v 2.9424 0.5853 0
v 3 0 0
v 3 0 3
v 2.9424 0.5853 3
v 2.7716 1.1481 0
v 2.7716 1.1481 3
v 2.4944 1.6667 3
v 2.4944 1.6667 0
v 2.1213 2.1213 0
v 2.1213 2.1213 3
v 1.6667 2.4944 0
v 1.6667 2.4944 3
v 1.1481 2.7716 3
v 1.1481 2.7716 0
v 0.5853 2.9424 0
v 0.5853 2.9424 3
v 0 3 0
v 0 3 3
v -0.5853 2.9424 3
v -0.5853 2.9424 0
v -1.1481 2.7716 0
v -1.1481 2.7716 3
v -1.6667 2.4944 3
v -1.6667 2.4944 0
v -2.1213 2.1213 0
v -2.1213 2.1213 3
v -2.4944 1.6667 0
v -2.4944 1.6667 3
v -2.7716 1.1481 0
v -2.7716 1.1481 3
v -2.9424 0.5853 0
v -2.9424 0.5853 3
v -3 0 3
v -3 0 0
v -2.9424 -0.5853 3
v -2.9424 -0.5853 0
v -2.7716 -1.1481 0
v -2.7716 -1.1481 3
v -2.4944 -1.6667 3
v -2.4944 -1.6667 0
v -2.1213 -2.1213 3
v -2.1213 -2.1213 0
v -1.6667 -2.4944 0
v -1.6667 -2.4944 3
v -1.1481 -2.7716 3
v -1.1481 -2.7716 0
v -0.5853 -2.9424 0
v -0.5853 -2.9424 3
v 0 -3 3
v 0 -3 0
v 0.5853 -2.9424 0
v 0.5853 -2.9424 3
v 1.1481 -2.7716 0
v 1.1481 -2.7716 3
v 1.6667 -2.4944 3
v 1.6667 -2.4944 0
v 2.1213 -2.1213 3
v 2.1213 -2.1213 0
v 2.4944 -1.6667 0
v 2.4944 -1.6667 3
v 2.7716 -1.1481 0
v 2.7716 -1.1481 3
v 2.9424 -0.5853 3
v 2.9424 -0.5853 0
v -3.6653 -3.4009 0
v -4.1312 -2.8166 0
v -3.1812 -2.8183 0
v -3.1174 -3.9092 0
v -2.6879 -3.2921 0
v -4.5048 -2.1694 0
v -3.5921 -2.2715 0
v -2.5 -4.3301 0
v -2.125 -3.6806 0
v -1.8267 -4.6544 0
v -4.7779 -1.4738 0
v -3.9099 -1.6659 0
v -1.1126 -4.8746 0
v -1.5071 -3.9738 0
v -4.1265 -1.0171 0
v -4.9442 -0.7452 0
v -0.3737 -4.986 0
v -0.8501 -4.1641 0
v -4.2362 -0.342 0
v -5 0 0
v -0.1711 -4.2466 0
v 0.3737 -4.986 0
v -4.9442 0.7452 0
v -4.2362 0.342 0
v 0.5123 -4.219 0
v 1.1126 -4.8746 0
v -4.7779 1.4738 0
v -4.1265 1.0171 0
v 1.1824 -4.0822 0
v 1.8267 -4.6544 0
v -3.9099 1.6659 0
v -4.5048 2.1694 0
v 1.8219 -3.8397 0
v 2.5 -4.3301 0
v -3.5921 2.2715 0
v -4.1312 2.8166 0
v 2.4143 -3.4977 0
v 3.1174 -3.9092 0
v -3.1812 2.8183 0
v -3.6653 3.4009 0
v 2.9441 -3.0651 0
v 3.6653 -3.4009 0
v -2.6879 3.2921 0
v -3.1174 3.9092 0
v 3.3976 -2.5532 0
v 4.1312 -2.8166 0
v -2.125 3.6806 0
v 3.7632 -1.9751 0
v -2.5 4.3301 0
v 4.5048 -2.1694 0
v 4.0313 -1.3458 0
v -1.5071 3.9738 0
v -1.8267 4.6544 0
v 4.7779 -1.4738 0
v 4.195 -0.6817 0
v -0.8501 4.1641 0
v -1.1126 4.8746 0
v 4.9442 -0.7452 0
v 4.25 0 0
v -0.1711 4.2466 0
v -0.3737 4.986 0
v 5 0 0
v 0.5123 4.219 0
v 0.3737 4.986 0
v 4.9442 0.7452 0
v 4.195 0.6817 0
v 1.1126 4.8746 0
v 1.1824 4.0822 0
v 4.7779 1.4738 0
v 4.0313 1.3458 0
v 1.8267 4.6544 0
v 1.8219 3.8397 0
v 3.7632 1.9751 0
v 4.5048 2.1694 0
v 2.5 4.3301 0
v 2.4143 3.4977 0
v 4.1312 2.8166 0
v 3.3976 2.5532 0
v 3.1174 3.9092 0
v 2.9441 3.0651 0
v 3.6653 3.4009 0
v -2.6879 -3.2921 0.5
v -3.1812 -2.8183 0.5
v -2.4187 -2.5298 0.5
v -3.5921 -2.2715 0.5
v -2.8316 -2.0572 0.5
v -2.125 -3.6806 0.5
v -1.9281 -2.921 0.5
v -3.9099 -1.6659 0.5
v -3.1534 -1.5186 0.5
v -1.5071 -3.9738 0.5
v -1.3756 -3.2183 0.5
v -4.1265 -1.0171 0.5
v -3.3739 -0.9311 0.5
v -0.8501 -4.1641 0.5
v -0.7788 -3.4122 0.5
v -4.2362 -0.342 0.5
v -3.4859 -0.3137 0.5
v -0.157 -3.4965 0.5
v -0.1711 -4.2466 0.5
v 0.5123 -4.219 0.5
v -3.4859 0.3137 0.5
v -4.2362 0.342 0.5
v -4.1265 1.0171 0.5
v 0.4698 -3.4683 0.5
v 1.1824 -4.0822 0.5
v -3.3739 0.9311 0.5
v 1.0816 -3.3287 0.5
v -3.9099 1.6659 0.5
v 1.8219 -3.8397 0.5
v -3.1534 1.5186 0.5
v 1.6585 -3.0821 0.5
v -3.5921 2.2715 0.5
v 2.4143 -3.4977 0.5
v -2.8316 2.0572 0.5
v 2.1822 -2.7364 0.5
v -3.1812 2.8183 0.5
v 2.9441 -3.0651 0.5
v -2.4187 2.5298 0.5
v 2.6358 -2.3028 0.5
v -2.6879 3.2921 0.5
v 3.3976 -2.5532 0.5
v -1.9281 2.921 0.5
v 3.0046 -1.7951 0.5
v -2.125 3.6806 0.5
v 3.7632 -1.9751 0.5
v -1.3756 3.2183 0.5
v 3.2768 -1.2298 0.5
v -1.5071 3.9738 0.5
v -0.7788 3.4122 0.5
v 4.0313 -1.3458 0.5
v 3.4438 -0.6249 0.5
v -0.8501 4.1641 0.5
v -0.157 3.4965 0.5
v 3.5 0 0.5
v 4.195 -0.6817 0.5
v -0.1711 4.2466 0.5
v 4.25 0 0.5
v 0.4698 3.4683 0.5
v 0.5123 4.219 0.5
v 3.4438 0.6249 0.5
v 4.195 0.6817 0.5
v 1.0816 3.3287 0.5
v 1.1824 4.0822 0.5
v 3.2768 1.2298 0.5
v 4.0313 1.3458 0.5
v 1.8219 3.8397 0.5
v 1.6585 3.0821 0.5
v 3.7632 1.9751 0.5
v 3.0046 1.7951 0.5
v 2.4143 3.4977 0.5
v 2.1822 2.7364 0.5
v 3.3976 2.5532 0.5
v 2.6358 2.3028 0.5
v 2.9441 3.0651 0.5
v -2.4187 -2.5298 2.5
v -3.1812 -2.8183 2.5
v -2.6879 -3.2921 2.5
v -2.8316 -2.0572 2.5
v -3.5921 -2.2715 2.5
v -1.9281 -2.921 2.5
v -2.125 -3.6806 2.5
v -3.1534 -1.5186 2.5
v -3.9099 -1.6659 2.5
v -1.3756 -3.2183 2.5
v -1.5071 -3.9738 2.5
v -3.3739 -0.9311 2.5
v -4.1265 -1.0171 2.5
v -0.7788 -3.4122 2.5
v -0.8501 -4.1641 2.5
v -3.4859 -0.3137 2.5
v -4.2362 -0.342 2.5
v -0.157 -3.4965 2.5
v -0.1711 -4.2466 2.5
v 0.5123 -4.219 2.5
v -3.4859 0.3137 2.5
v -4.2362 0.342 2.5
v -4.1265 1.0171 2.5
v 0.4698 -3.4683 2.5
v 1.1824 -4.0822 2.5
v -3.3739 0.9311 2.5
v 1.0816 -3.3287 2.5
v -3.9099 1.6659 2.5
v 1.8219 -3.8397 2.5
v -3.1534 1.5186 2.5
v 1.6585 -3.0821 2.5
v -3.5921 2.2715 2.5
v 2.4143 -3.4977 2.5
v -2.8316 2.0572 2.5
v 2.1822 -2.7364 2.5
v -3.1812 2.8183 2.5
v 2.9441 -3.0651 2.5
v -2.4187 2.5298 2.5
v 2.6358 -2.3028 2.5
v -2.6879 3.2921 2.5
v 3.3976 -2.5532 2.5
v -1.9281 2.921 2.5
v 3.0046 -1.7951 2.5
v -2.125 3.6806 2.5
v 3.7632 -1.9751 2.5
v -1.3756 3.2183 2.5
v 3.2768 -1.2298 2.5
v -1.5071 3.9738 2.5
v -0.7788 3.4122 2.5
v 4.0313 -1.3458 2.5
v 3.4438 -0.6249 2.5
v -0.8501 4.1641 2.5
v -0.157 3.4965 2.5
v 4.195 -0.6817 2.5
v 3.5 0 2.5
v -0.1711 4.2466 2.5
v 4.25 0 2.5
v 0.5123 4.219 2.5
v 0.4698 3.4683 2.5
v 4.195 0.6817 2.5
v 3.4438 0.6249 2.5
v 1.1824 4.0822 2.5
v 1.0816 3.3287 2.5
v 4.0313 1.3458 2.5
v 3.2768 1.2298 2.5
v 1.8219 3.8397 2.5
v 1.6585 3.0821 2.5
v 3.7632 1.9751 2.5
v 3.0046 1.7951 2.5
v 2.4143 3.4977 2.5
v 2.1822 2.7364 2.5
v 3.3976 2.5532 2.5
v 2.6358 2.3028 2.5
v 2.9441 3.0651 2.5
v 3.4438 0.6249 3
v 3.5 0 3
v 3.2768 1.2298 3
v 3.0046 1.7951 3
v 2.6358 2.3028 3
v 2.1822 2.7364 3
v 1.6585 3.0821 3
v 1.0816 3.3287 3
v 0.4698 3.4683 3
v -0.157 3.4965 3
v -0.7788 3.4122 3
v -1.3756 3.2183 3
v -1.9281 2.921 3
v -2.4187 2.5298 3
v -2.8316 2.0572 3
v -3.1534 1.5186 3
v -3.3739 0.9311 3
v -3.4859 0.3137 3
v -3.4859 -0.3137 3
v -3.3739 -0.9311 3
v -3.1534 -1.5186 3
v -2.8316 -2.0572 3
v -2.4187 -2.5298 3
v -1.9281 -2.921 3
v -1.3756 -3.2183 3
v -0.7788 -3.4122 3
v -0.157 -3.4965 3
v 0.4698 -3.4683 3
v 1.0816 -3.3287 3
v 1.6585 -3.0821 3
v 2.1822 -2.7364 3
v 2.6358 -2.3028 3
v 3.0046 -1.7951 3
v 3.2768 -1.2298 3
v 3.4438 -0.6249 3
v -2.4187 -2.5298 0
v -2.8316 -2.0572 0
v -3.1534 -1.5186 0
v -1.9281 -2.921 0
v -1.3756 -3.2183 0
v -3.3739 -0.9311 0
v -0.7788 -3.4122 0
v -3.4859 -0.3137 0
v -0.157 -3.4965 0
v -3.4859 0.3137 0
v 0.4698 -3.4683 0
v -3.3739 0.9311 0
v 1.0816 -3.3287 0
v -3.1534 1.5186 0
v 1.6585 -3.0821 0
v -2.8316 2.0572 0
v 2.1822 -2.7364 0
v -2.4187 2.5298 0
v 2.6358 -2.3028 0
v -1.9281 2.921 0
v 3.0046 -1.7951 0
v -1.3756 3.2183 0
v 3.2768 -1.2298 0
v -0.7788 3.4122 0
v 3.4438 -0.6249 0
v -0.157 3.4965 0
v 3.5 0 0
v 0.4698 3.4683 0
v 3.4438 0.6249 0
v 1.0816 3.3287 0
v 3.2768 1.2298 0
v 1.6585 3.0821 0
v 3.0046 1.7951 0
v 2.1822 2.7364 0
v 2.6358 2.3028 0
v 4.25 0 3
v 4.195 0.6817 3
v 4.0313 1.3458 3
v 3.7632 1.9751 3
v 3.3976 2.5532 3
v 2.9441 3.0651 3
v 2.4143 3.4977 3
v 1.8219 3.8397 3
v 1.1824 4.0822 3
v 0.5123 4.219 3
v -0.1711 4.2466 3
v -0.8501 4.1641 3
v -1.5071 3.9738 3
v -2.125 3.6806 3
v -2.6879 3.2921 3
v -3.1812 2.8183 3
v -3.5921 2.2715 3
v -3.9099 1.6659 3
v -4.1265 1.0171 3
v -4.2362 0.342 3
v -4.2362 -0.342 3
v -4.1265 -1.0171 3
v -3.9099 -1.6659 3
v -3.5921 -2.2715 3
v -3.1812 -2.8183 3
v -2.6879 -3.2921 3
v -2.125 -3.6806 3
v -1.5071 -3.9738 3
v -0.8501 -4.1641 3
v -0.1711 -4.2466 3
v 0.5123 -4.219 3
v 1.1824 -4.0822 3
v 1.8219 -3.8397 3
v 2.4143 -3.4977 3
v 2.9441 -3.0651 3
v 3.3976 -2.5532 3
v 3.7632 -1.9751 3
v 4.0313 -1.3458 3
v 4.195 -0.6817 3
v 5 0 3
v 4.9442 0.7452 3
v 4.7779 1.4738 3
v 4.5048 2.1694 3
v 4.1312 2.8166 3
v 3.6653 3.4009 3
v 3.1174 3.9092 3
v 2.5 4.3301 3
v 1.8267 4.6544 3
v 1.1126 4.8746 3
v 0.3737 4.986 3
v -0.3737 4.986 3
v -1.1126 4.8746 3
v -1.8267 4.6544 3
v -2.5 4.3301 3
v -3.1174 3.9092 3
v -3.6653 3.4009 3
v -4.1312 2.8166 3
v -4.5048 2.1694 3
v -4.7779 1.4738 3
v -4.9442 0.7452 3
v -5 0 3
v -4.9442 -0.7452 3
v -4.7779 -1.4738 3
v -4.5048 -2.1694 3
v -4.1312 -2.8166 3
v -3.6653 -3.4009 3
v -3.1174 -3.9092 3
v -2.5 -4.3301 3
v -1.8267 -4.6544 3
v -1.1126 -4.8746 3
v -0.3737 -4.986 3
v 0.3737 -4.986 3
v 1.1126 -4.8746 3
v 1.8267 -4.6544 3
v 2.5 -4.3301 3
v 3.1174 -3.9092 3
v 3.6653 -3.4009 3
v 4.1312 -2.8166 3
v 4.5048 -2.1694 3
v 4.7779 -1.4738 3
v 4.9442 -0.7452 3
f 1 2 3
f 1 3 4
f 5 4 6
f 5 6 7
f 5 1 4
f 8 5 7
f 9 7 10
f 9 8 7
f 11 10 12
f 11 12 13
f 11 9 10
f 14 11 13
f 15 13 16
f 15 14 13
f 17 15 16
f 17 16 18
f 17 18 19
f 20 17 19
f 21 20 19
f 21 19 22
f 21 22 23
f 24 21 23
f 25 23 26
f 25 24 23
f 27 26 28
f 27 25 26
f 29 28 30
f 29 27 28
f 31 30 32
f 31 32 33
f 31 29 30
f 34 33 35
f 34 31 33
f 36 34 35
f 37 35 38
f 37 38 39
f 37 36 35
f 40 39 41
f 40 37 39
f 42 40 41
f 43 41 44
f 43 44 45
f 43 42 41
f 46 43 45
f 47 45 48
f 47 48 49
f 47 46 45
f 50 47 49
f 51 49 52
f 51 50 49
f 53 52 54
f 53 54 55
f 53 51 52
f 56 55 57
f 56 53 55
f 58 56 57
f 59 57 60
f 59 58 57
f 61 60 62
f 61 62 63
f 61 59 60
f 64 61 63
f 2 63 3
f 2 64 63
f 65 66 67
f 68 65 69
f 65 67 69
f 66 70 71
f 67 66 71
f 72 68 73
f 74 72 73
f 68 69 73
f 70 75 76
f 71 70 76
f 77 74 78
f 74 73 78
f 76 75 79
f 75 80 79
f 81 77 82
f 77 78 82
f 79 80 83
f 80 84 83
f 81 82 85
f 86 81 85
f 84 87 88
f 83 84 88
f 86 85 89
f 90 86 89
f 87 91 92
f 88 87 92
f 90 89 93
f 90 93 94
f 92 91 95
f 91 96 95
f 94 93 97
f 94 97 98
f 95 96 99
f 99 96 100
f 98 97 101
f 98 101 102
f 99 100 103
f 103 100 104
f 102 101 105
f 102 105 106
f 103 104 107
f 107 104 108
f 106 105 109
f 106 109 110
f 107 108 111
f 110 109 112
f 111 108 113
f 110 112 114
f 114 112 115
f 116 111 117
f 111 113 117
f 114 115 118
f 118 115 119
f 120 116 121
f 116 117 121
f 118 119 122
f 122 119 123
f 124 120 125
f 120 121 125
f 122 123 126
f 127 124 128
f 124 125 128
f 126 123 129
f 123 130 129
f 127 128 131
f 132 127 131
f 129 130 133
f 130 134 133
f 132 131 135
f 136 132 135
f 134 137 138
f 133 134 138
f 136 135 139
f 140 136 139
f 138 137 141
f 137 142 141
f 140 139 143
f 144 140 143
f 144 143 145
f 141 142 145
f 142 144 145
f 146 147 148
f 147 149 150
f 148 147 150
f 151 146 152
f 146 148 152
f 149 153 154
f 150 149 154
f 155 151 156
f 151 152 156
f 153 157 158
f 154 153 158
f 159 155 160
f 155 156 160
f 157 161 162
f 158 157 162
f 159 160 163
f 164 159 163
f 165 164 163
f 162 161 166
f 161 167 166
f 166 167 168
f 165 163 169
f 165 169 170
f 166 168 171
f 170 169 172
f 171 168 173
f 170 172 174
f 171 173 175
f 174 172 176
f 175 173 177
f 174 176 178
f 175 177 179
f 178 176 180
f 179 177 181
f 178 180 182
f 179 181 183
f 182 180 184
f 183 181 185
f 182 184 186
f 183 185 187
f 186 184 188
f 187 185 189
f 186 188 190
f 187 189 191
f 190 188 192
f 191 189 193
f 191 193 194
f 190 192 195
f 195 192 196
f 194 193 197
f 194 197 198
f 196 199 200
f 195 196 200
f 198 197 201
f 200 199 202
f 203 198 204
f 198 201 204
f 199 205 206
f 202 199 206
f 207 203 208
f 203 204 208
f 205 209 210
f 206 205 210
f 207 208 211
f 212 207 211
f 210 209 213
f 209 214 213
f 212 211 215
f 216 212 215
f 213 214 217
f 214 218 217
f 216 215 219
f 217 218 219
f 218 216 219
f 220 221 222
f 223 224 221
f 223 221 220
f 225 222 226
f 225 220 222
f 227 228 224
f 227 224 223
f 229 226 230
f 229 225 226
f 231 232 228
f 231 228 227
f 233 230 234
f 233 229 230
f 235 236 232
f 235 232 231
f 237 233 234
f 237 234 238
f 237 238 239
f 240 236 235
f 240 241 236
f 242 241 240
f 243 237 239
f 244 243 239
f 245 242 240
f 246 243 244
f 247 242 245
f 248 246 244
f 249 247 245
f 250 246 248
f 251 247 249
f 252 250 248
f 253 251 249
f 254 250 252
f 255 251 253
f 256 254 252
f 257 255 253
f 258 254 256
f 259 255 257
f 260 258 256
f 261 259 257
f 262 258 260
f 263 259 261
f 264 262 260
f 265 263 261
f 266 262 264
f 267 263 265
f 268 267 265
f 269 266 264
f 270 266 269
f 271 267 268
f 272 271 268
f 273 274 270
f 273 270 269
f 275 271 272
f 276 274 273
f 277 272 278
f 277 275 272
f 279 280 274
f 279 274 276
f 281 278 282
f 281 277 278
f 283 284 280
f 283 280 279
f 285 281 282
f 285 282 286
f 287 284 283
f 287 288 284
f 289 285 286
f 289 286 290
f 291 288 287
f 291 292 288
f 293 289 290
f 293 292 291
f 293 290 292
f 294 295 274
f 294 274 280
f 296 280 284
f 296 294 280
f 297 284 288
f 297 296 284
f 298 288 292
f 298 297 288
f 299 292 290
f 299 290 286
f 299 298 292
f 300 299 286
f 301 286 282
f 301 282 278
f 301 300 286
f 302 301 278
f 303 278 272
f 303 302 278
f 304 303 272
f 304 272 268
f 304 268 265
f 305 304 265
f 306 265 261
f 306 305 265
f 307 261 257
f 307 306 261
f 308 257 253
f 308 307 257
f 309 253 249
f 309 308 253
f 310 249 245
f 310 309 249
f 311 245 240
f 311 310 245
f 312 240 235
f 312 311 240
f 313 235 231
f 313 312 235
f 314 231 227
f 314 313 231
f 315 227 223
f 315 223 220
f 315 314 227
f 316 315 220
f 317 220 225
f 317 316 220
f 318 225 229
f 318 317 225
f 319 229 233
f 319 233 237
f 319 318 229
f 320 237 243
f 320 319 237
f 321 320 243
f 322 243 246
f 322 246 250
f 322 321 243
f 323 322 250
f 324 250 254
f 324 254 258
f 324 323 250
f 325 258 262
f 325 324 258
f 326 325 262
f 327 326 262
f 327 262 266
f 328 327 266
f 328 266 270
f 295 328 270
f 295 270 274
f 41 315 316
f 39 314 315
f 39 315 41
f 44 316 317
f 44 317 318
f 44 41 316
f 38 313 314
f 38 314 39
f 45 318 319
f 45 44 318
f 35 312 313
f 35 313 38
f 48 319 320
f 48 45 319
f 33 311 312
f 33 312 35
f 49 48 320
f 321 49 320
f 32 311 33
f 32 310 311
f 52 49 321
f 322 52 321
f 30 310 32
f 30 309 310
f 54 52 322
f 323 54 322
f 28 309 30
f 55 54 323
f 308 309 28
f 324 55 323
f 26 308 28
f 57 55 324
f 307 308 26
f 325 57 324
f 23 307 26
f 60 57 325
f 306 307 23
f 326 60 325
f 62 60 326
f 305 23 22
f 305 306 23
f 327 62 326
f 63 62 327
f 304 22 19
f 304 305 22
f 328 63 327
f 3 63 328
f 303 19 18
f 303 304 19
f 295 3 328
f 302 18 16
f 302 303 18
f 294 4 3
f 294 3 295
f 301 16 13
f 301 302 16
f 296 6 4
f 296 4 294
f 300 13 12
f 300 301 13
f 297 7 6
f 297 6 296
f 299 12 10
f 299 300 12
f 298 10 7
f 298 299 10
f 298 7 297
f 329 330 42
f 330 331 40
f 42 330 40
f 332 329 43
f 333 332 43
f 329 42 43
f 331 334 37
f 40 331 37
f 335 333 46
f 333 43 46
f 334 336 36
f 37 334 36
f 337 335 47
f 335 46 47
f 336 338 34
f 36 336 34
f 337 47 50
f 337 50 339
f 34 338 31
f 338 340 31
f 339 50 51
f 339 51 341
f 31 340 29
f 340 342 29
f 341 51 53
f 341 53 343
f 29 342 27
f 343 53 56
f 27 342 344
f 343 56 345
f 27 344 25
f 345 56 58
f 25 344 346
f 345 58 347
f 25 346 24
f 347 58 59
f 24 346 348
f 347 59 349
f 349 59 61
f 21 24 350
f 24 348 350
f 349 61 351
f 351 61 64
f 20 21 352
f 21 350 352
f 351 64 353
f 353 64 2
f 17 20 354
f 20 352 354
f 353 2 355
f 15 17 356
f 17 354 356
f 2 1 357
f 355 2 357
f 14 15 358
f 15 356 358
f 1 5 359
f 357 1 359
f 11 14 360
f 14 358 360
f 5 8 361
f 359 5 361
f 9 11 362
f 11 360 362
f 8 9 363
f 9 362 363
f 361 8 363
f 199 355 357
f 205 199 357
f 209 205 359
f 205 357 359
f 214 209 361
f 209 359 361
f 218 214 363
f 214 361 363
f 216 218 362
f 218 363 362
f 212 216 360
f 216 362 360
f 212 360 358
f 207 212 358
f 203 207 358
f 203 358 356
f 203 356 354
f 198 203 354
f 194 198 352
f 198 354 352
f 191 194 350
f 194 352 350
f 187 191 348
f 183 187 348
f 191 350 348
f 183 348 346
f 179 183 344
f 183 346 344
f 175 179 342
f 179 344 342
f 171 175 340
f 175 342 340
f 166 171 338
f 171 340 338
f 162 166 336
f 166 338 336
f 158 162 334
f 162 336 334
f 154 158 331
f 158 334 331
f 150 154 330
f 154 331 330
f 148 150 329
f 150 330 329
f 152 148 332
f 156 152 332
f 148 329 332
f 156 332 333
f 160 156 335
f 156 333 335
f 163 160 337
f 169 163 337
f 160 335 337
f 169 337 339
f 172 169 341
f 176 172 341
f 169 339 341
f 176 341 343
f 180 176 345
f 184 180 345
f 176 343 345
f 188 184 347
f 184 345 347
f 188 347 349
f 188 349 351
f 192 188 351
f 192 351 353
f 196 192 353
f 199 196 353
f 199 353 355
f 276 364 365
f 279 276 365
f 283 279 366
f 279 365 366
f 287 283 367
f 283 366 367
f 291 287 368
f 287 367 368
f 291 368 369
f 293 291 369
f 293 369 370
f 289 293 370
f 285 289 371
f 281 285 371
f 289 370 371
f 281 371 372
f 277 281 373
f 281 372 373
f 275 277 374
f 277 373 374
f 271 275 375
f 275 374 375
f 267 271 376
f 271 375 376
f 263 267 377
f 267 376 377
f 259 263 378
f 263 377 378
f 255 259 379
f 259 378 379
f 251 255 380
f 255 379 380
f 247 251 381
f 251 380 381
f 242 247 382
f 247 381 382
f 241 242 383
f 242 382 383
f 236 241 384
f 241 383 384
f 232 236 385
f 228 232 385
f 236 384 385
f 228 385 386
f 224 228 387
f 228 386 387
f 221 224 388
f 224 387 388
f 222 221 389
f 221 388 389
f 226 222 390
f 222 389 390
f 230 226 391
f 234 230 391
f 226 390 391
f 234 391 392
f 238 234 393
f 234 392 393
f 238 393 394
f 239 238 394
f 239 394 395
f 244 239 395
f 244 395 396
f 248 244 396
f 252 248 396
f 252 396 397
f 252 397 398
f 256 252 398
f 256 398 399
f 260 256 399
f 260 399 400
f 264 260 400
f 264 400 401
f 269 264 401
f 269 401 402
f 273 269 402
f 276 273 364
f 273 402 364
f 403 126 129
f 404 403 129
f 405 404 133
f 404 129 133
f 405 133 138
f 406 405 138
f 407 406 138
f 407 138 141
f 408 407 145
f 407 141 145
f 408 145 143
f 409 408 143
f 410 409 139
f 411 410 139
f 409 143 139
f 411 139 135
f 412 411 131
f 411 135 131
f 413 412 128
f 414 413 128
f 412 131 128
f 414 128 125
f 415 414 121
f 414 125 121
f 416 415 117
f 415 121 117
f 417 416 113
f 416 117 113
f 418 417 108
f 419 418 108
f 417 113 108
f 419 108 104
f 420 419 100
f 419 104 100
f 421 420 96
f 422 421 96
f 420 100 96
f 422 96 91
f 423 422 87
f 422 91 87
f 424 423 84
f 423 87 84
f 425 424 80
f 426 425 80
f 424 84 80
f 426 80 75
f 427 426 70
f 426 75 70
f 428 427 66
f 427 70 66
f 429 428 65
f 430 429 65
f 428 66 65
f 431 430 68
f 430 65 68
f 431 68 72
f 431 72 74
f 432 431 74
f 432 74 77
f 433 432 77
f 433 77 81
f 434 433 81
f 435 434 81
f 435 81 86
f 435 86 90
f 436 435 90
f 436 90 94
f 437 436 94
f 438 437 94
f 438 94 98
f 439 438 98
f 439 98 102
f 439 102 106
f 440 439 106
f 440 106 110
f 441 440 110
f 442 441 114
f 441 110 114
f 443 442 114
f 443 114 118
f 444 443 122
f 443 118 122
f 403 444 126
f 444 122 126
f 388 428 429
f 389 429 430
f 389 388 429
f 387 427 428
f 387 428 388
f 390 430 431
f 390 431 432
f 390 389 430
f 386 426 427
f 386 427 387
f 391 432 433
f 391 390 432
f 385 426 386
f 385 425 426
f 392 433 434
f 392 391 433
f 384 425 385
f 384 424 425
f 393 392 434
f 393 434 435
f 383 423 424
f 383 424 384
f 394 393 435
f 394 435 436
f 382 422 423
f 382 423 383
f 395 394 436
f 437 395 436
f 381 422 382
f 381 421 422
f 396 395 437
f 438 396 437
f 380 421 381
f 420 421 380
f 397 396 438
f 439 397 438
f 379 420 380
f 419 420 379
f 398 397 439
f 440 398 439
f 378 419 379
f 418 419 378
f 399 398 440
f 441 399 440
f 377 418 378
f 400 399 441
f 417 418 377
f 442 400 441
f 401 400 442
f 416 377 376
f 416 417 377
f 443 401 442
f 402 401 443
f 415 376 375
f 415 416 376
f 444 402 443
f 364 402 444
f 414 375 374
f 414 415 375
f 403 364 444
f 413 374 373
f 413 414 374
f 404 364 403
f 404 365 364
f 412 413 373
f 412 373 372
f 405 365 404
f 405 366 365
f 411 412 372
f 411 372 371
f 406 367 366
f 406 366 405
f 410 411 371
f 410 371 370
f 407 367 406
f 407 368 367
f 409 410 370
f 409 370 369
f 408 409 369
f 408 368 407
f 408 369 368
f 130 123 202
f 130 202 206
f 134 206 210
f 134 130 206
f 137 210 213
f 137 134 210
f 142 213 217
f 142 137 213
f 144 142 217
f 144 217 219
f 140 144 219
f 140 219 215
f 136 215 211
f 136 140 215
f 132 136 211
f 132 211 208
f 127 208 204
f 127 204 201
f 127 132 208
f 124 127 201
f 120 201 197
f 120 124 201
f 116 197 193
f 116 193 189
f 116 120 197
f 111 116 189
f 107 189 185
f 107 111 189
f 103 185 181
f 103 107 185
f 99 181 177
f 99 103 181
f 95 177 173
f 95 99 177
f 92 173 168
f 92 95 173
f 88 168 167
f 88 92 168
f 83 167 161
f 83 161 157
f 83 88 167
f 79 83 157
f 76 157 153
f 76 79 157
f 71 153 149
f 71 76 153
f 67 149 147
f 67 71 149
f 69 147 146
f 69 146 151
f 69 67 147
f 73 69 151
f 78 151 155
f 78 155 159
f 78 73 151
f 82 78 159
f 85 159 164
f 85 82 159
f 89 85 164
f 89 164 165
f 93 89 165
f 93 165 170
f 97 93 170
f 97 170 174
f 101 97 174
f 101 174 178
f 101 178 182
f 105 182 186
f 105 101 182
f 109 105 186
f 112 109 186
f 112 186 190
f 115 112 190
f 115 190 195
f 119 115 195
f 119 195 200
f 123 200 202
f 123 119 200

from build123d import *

# Parameters (mm, degrees)
SKETCH_1_R          = 5
SKETCH_1_R_2        = 3
EXTRUDE_1_DEPTH     = 3
SKETCH_2_R          = 4.25
SKETCH_2_R_2        = 3.5
CUT_EXTRUDE_1_DEPTH = 0.5


with BuildPart() as part:
    # 草图1 → 凸台-拉伸1 (new body)
    with BuildSketch(Plane.XY):
        Circle(SKETCH_1_R)
        Circle(SKETCH_1_R_2, mode=Mode.SUBTRACT)
    extrude(amount=EXTRUDE_1_DEPTH)

    # 草图2 → 切除-拉伸1 (cut)
    with BuildSketch(Plane.XY.offset(3)):
        Circle(SKETCH_2_R)
        Circle(SKETCH_2_R_2, mode=Mode.SUBTRACT)
    cut_extrude_1 = extrude(amount=-CUT_EXTRUDE_1_DEPTH, mode=Mode.SUBTRACT)

    # 镜向1: 切除-拉伸1 across plane
    add(cut_extrude_1.mirror(Plane.XY.offset(1.5)), mode=Mode.SUBTRACT)


solid = part.part
